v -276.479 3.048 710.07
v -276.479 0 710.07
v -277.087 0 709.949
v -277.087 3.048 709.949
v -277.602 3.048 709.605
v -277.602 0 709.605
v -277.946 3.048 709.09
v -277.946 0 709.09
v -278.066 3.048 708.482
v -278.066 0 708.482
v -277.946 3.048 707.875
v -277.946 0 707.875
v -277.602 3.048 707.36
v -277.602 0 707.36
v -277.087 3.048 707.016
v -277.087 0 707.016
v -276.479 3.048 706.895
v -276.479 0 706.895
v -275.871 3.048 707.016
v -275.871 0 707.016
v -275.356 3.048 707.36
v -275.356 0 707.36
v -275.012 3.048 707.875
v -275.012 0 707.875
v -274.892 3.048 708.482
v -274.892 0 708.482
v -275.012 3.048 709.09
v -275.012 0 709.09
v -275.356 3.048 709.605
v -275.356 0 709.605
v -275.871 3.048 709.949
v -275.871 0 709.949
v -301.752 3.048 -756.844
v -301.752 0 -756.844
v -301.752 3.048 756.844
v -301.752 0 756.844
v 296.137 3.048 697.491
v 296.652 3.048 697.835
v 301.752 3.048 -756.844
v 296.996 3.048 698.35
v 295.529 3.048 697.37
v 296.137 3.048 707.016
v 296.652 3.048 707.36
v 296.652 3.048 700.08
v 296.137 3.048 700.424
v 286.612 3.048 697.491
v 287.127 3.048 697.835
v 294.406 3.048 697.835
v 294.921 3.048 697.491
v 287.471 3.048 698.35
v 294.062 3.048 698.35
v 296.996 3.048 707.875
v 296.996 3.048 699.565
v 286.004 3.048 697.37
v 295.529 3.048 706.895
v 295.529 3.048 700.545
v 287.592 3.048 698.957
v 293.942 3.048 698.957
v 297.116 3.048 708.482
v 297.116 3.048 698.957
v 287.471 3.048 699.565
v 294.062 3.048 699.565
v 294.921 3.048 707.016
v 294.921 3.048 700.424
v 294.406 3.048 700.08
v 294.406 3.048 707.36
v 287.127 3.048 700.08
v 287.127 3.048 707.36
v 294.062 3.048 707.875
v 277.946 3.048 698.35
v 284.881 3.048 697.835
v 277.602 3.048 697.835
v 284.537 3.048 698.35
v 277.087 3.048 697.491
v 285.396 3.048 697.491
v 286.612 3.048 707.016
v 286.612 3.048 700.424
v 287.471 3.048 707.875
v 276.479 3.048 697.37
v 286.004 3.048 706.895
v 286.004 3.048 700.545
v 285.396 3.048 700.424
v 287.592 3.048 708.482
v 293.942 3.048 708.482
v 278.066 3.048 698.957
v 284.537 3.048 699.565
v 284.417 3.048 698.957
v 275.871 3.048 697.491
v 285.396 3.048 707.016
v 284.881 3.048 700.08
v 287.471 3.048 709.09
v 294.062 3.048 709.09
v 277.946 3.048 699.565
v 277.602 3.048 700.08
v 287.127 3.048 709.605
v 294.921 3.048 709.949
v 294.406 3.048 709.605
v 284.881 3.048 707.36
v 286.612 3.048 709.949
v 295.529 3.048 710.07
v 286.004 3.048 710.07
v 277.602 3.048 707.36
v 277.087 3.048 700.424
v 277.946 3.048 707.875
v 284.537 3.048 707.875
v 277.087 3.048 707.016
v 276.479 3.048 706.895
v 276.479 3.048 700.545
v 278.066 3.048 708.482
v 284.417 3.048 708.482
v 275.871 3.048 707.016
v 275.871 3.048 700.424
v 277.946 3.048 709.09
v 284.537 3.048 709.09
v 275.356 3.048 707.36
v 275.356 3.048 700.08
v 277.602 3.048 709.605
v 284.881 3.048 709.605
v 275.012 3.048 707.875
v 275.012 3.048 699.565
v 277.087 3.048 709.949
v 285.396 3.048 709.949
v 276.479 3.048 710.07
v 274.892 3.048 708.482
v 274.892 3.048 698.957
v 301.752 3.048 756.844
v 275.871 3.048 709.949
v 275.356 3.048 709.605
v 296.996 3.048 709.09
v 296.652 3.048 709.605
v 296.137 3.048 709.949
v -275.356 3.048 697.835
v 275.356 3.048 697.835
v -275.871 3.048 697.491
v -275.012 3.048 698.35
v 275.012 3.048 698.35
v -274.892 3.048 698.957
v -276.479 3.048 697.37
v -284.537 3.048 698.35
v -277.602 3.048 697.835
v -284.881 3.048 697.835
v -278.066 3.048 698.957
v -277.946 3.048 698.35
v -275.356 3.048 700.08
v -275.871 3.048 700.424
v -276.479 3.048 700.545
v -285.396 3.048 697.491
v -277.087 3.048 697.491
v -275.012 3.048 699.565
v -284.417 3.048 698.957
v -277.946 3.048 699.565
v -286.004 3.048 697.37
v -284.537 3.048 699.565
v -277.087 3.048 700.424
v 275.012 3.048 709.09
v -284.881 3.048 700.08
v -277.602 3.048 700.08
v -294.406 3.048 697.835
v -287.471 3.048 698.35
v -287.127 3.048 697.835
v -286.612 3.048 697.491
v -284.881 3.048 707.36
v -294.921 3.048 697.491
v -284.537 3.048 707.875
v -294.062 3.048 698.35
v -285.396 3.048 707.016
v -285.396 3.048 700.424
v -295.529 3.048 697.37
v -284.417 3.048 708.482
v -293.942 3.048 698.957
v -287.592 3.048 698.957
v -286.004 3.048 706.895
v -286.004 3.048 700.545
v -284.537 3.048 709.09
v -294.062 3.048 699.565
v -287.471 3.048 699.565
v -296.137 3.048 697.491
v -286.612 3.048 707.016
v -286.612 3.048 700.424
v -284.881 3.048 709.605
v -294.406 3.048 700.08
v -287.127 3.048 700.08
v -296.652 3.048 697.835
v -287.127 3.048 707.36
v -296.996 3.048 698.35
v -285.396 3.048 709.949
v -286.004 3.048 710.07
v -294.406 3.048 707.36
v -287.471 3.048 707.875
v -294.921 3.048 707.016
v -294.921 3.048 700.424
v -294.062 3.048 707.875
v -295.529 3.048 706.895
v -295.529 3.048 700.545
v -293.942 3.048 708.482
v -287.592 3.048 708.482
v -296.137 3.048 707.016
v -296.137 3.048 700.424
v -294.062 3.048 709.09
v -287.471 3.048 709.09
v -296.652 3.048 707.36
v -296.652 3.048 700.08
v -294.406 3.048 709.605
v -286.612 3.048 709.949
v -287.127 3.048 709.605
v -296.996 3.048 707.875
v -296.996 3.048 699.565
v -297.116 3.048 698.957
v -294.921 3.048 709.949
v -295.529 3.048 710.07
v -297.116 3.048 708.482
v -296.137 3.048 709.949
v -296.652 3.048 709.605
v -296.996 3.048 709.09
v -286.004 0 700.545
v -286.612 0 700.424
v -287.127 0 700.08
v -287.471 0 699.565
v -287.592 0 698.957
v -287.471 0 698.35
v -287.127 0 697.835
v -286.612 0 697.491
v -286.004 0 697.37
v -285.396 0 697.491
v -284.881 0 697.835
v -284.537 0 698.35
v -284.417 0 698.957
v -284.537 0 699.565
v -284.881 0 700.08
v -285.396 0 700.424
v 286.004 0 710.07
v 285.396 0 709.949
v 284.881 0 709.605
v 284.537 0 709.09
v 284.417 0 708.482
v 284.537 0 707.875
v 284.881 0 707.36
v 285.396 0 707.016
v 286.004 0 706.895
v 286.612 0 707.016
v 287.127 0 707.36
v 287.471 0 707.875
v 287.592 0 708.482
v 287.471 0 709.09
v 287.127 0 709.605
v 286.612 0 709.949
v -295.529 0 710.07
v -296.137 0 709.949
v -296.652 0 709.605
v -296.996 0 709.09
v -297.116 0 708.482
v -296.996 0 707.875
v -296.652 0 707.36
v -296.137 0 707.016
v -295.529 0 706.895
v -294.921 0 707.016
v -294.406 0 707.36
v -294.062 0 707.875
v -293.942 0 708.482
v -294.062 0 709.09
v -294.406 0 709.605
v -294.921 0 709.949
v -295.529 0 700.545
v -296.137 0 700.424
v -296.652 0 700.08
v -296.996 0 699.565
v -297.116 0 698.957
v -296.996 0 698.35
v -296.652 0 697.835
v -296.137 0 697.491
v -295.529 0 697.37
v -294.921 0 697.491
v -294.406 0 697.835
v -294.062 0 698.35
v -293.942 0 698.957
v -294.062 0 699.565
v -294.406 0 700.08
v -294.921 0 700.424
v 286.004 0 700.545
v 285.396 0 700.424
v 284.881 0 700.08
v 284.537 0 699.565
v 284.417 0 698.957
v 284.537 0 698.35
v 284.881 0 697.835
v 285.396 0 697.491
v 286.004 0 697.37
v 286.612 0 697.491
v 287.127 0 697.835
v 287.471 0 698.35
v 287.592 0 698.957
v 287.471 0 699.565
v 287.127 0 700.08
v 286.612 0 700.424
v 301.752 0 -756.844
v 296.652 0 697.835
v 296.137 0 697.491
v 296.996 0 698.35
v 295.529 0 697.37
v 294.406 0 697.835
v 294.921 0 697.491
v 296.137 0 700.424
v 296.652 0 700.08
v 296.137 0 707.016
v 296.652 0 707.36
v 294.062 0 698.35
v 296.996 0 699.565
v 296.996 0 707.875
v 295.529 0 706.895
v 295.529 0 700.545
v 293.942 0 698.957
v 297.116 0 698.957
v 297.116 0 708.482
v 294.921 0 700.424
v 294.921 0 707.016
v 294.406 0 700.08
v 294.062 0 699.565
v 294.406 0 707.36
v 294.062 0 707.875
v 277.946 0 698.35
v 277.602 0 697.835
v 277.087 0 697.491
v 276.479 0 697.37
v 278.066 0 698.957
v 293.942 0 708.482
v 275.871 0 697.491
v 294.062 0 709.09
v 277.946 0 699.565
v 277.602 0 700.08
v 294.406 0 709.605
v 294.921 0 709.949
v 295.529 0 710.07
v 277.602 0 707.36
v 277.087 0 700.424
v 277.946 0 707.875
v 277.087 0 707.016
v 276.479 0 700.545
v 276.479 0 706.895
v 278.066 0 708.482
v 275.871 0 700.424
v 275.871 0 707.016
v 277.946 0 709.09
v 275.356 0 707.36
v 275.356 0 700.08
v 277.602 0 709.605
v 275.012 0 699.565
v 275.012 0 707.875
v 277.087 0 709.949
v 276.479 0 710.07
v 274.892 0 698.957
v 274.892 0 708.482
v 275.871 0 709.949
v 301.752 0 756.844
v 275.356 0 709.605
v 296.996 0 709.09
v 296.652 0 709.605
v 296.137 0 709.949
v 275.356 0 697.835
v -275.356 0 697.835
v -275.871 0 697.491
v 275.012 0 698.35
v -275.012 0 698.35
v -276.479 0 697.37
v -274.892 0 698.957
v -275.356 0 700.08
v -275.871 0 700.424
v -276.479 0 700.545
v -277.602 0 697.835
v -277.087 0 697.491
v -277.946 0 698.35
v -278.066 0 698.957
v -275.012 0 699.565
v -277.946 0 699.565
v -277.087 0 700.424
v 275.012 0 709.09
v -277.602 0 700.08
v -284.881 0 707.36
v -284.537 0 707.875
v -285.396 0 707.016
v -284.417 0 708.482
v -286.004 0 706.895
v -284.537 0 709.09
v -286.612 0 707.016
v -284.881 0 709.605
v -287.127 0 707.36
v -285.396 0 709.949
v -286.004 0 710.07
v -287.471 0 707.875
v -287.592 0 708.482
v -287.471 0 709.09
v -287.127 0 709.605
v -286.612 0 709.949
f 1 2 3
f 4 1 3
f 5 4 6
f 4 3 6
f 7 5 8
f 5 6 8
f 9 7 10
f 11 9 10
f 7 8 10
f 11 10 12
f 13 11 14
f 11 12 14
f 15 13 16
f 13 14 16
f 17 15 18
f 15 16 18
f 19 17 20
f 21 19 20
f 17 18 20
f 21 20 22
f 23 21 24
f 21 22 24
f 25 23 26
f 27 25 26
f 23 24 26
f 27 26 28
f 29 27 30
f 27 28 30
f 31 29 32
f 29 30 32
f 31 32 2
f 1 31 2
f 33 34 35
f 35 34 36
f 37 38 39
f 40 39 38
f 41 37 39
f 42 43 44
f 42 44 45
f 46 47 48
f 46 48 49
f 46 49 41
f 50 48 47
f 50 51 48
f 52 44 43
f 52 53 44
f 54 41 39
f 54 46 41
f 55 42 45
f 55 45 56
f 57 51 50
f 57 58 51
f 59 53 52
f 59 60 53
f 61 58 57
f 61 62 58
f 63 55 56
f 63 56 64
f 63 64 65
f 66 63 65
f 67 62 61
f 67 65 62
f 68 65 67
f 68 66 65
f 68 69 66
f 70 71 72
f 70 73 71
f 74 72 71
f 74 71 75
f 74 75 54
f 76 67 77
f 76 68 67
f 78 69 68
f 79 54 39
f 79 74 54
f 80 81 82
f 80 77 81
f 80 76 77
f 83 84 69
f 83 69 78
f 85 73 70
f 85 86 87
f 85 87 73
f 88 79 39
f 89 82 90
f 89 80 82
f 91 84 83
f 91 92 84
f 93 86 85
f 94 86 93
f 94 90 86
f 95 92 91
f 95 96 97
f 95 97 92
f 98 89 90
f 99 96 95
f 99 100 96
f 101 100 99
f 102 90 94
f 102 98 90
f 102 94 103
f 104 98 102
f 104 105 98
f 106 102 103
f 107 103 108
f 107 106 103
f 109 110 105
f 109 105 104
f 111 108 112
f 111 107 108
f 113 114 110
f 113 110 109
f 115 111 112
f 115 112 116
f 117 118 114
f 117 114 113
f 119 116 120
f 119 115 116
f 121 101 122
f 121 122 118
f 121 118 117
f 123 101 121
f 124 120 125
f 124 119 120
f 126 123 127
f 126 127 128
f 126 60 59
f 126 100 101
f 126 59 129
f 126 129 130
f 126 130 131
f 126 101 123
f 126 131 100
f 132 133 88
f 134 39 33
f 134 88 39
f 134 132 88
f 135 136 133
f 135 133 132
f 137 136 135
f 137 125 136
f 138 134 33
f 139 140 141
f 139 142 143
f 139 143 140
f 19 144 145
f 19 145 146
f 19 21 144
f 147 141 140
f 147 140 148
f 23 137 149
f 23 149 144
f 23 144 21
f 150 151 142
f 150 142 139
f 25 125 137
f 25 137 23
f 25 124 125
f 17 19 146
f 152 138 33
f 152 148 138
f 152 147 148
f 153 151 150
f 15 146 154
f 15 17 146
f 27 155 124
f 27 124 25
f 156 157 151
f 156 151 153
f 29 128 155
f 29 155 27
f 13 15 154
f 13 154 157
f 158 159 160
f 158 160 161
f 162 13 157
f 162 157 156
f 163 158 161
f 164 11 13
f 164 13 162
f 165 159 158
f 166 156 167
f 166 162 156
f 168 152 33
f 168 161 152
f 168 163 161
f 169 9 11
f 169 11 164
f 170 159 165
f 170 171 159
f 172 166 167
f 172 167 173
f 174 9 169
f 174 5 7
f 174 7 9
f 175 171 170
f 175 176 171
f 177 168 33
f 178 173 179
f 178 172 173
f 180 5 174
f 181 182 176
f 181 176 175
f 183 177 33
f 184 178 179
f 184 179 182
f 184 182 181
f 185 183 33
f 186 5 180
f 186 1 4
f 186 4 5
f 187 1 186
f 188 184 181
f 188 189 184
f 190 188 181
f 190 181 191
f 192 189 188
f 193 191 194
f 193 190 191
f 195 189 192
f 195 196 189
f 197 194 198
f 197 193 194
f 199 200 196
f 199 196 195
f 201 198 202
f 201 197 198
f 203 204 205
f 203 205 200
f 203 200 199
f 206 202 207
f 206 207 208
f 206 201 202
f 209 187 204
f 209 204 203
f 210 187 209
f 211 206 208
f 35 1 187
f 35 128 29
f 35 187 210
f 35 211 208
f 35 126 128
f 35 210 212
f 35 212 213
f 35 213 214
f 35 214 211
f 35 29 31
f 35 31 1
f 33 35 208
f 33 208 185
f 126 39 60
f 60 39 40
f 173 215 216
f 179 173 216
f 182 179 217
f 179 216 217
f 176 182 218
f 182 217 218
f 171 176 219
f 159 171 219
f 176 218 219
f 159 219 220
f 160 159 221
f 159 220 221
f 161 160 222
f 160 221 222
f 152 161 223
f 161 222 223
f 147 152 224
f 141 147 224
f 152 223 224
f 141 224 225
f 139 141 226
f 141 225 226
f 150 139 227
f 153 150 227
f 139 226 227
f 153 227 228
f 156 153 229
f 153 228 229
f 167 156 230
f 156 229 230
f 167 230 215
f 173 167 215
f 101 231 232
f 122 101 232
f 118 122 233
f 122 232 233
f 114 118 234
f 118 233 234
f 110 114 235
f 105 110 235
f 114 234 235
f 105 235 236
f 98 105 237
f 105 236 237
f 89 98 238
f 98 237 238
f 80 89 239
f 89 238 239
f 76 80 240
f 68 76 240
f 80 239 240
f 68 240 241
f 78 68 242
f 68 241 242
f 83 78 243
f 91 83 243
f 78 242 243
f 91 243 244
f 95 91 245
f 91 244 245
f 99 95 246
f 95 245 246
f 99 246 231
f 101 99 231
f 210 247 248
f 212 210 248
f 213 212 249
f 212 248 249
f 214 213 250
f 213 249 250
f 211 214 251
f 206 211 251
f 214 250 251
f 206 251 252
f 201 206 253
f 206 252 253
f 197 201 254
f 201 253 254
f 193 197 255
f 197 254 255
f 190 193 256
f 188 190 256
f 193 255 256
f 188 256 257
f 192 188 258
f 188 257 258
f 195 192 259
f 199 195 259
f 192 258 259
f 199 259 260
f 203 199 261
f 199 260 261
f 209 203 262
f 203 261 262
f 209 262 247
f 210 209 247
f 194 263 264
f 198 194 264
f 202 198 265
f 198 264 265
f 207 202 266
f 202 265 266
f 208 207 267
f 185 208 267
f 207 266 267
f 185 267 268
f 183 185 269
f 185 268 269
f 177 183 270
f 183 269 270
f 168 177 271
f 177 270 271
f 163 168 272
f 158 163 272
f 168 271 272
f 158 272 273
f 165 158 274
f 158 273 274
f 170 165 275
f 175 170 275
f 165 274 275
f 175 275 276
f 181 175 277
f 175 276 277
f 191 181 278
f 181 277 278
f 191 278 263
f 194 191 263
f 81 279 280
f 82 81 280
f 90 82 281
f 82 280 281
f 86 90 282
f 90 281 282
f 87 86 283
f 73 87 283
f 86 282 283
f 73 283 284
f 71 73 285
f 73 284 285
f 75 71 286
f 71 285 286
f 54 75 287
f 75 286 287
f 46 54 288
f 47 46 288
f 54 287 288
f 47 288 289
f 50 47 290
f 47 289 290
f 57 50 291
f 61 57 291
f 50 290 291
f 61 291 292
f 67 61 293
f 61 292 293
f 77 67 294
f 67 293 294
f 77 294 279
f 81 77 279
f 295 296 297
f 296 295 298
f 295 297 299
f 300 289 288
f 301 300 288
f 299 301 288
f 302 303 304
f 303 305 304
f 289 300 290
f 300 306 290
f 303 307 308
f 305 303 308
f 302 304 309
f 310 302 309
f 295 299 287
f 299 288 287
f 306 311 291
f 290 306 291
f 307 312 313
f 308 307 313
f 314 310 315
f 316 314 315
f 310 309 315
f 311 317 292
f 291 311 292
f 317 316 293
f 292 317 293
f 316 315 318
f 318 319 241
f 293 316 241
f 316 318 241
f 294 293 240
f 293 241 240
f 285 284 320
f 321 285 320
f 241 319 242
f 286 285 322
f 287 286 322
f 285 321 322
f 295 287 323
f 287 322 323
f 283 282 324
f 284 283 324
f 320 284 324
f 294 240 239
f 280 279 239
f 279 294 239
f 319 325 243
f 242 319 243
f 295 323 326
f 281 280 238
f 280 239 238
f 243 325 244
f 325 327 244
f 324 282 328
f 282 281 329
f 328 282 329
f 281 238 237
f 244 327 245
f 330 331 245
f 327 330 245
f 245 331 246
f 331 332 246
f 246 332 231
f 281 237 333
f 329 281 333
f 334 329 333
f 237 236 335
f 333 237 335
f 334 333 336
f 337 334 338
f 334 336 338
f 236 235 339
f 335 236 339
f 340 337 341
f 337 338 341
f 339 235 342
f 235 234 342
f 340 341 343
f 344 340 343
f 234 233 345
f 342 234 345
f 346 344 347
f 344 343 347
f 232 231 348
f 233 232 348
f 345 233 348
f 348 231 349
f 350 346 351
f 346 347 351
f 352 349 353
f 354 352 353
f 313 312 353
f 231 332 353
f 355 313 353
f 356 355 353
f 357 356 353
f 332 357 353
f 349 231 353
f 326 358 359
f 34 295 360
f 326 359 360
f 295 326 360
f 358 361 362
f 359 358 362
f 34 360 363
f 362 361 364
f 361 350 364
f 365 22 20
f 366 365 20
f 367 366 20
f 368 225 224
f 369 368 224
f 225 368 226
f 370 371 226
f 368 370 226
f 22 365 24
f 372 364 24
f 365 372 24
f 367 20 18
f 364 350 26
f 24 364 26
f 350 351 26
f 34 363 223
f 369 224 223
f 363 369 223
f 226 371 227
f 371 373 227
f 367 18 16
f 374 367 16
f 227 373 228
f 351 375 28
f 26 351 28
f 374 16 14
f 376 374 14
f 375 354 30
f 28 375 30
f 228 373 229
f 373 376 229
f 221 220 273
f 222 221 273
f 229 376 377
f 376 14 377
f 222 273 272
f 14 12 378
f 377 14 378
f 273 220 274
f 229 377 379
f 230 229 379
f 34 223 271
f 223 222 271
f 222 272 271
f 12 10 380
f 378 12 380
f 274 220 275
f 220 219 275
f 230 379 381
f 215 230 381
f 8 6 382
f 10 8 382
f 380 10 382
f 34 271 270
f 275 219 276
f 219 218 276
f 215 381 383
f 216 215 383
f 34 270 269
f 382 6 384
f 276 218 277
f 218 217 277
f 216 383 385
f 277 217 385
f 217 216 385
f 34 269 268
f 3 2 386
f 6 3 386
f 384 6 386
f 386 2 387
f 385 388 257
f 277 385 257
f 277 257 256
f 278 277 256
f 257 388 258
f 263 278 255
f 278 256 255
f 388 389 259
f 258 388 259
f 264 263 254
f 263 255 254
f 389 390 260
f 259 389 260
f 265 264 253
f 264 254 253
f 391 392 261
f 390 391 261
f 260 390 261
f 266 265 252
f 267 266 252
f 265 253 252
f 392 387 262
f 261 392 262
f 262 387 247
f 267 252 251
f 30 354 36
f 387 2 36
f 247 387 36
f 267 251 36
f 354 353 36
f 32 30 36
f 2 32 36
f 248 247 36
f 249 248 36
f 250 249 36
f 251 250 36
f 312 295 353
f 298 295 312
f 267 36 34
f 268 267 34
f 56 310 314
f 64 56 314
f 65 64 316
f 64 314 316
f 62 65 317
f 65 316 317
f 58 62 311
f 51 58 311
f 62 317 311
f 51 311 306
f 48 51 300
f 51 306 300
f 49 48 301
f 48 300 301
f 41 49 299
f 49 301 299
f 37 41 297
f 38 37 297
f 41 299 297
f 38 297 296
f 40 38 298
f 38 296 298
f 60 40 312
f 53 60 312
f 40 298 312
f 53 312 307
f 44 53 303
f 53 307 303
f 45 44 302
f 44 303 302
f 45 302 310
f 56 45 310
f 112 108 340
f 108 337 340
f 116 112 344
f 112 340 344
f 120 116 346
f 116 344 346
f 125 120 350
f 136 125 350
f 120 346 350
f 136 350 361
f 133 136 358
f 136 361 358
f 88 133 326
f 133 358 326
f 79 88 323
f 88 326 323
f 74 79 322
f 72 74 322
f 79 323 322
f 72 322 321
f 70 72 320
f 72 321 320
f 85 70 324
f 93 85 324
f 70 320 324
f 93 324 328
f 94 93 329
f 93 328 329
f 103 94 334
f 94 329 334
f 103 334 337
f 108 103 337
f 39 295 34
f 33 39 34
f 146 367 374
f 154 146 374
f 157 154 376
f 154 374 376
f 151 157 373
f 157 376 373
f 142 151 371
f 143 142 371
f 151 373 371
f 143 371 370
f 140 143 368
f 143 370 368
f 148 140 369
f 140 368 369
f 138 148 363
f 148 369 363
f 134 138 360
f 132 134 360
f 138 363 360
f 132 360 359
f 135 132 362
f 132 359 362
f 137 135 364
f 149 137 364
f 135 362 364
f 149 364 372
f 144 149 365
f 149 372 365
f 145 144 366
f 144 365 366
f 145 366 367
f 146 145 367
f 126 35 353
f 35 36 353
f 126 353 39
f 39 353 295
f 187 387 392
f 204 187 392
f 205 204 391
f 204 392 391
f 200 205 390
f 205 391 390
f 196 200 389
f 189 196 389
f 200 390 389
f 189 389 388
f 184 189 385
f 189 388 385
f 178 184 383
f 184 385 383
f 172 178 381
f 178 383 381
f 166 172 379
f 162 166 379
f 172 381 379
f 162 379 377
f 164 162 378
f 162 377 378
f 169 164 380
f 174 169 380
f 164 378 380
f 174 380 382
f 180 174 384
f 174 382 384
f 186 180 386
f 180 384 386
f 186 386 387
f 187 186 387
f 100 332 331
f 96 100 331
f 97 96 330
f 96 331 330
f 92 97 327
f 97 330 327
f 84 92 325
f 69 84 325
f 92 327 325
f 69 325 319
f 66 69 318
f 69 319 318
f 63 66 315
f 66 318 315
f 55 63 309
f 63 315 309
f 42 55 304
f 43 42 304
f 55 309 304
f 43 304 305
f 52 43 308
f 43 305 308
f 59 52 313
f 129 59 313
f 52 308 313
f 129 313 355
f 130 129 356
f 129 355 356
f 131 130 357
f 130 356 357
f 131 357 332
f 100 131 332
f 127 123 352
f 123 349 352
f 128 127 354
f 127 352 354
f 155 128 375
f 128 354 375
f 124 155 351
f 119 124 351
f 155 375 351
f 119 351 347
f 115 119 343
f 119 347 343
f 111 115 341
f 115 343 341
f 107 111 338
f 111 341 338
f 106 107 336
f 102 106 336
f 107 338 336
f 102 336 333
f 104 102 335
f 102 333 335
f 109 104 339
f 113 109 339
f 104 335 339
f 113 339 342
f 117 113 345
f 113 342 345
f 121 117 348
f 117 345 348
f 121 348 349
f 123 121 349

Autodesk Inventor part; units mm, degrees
ref_plane "YZ Plane" through (0, 0, 0) normal (1, 0, 0) x (0, 1, 0)
ref_plane "XZ Plane" through (0, 0, 0) normal (0, 1, 0) x (-1, 0, 0)
ref_plane "XY Plane" through (0, 0, 0) normal (0, 0, 1) x (1, 0, 0)
sketch "Sketch2" plane through (0, 0, 0) normal (0, 1, 0) x (-1, 0, 0)
  line L0 (-301.752, -756.8438) -> (301.752, -756.8438)
  line L1 (301.752, -756.8438) -> (301.752, 756.8438)
  line L2 (301.752, 756.8438) -> (-301.752, 756.8438)
  line L3 (-301.752, 756.8438) -> (-301.752, -756.8438)
  point P0 (0, 0)
  dimension "d0" = 301.752
  dimension "d1" = 301.752
  dimension "d2" = 756.8438
  dimension "d3" = 756.8438
extrude "Plate1" add sketch "Sketch2" along normal blind 3.048
sketch "Sketch3" plane through (0, 3.048, 0) normal (0, 1, 0) x (1, 0, 0)
  line L0 (301.752, 756.8438) -> (301.752, -756.8438) projected
  line L1 (-301.752, -756.8438) -> (-301.752, 756.8438) projected
  line L2 (301.752, -756.8438) -> (-301.752, -756.8438) projected
  point P0 (0, 0)
  point P1 (-295.529, -698.9572)
  point P2 (276.479, -698.9572)
  dimension "d5" = 6.223
  dimension "d6" = 25.273
  dimension "d22" = 57.8866
  dimension "d23" = 57.8866
hole "Hole1" at (-295.529, 3.048, 698.9572) at (276.479, 3.048, 698.9572) direction (0, -1, 0) diameter 3.175 end through all
sketch "Sketch4" plane through (0, 3.048, 0) normal (0, 1, 0) x (1, 0, 0)
  circle A0 centre (-295.529, -698.9572) radius 1.5875 projected
  line L0 (301.752, -756.8438) -> (-301.752, -756.8438) projected
  line L1 (-295.529, -698.9572) -> (-270.8654, -698.9572)
  point P0 (0, 0)
sketch "Sketch5" plane through (0, 3.048, 0) normal (0, 1, 0) x (1, 0, 0)
  circle A0 centre (-295.529, -698.9572) radius 1.5875 projected
  line L0 (301.752, -756.8438) -> (-301.752, -756.8438) projected
  line L1 (-295.529, -698.9572) -> (-295.529, -717.14)
  line L2 (301.752, 756.8438) -> (301.752, -756.8438) projected
  point P0 (0, 0)
pattern_linear "Rectangular Pattern1" count 3 spacing 9.525 along (1, 0, 0) count 2 spacing 9.525 along (0, 0, 1) of "Hole1"
equation "\"d23\" = d22"
equation "\"d14\" = Thickness"
equation "\"d1\" = d0"
equation "\"d3\" = d2"
equation "\"BendRadius\" = Thickness"
equation "\"BendReliefWidth\" = Thickness"
equation "\"BendReliefDepth\" = 0.5 * Thickness"
equation "\"CornerReliefSize\" = 4 * Thickness"
equation "\"MinimumRemnant\" = 2 * Thickness"
equation "\"TransitionRadius\" = BendRadius"
equation "\"JacobiRadiusSize\" = BendRadius"
equation "\"GapSize\" = Thickness"
equation "\"d4\" = BendRadius"
equation "\"Thickness\" = 3.048"
properties part number "Base Top"
